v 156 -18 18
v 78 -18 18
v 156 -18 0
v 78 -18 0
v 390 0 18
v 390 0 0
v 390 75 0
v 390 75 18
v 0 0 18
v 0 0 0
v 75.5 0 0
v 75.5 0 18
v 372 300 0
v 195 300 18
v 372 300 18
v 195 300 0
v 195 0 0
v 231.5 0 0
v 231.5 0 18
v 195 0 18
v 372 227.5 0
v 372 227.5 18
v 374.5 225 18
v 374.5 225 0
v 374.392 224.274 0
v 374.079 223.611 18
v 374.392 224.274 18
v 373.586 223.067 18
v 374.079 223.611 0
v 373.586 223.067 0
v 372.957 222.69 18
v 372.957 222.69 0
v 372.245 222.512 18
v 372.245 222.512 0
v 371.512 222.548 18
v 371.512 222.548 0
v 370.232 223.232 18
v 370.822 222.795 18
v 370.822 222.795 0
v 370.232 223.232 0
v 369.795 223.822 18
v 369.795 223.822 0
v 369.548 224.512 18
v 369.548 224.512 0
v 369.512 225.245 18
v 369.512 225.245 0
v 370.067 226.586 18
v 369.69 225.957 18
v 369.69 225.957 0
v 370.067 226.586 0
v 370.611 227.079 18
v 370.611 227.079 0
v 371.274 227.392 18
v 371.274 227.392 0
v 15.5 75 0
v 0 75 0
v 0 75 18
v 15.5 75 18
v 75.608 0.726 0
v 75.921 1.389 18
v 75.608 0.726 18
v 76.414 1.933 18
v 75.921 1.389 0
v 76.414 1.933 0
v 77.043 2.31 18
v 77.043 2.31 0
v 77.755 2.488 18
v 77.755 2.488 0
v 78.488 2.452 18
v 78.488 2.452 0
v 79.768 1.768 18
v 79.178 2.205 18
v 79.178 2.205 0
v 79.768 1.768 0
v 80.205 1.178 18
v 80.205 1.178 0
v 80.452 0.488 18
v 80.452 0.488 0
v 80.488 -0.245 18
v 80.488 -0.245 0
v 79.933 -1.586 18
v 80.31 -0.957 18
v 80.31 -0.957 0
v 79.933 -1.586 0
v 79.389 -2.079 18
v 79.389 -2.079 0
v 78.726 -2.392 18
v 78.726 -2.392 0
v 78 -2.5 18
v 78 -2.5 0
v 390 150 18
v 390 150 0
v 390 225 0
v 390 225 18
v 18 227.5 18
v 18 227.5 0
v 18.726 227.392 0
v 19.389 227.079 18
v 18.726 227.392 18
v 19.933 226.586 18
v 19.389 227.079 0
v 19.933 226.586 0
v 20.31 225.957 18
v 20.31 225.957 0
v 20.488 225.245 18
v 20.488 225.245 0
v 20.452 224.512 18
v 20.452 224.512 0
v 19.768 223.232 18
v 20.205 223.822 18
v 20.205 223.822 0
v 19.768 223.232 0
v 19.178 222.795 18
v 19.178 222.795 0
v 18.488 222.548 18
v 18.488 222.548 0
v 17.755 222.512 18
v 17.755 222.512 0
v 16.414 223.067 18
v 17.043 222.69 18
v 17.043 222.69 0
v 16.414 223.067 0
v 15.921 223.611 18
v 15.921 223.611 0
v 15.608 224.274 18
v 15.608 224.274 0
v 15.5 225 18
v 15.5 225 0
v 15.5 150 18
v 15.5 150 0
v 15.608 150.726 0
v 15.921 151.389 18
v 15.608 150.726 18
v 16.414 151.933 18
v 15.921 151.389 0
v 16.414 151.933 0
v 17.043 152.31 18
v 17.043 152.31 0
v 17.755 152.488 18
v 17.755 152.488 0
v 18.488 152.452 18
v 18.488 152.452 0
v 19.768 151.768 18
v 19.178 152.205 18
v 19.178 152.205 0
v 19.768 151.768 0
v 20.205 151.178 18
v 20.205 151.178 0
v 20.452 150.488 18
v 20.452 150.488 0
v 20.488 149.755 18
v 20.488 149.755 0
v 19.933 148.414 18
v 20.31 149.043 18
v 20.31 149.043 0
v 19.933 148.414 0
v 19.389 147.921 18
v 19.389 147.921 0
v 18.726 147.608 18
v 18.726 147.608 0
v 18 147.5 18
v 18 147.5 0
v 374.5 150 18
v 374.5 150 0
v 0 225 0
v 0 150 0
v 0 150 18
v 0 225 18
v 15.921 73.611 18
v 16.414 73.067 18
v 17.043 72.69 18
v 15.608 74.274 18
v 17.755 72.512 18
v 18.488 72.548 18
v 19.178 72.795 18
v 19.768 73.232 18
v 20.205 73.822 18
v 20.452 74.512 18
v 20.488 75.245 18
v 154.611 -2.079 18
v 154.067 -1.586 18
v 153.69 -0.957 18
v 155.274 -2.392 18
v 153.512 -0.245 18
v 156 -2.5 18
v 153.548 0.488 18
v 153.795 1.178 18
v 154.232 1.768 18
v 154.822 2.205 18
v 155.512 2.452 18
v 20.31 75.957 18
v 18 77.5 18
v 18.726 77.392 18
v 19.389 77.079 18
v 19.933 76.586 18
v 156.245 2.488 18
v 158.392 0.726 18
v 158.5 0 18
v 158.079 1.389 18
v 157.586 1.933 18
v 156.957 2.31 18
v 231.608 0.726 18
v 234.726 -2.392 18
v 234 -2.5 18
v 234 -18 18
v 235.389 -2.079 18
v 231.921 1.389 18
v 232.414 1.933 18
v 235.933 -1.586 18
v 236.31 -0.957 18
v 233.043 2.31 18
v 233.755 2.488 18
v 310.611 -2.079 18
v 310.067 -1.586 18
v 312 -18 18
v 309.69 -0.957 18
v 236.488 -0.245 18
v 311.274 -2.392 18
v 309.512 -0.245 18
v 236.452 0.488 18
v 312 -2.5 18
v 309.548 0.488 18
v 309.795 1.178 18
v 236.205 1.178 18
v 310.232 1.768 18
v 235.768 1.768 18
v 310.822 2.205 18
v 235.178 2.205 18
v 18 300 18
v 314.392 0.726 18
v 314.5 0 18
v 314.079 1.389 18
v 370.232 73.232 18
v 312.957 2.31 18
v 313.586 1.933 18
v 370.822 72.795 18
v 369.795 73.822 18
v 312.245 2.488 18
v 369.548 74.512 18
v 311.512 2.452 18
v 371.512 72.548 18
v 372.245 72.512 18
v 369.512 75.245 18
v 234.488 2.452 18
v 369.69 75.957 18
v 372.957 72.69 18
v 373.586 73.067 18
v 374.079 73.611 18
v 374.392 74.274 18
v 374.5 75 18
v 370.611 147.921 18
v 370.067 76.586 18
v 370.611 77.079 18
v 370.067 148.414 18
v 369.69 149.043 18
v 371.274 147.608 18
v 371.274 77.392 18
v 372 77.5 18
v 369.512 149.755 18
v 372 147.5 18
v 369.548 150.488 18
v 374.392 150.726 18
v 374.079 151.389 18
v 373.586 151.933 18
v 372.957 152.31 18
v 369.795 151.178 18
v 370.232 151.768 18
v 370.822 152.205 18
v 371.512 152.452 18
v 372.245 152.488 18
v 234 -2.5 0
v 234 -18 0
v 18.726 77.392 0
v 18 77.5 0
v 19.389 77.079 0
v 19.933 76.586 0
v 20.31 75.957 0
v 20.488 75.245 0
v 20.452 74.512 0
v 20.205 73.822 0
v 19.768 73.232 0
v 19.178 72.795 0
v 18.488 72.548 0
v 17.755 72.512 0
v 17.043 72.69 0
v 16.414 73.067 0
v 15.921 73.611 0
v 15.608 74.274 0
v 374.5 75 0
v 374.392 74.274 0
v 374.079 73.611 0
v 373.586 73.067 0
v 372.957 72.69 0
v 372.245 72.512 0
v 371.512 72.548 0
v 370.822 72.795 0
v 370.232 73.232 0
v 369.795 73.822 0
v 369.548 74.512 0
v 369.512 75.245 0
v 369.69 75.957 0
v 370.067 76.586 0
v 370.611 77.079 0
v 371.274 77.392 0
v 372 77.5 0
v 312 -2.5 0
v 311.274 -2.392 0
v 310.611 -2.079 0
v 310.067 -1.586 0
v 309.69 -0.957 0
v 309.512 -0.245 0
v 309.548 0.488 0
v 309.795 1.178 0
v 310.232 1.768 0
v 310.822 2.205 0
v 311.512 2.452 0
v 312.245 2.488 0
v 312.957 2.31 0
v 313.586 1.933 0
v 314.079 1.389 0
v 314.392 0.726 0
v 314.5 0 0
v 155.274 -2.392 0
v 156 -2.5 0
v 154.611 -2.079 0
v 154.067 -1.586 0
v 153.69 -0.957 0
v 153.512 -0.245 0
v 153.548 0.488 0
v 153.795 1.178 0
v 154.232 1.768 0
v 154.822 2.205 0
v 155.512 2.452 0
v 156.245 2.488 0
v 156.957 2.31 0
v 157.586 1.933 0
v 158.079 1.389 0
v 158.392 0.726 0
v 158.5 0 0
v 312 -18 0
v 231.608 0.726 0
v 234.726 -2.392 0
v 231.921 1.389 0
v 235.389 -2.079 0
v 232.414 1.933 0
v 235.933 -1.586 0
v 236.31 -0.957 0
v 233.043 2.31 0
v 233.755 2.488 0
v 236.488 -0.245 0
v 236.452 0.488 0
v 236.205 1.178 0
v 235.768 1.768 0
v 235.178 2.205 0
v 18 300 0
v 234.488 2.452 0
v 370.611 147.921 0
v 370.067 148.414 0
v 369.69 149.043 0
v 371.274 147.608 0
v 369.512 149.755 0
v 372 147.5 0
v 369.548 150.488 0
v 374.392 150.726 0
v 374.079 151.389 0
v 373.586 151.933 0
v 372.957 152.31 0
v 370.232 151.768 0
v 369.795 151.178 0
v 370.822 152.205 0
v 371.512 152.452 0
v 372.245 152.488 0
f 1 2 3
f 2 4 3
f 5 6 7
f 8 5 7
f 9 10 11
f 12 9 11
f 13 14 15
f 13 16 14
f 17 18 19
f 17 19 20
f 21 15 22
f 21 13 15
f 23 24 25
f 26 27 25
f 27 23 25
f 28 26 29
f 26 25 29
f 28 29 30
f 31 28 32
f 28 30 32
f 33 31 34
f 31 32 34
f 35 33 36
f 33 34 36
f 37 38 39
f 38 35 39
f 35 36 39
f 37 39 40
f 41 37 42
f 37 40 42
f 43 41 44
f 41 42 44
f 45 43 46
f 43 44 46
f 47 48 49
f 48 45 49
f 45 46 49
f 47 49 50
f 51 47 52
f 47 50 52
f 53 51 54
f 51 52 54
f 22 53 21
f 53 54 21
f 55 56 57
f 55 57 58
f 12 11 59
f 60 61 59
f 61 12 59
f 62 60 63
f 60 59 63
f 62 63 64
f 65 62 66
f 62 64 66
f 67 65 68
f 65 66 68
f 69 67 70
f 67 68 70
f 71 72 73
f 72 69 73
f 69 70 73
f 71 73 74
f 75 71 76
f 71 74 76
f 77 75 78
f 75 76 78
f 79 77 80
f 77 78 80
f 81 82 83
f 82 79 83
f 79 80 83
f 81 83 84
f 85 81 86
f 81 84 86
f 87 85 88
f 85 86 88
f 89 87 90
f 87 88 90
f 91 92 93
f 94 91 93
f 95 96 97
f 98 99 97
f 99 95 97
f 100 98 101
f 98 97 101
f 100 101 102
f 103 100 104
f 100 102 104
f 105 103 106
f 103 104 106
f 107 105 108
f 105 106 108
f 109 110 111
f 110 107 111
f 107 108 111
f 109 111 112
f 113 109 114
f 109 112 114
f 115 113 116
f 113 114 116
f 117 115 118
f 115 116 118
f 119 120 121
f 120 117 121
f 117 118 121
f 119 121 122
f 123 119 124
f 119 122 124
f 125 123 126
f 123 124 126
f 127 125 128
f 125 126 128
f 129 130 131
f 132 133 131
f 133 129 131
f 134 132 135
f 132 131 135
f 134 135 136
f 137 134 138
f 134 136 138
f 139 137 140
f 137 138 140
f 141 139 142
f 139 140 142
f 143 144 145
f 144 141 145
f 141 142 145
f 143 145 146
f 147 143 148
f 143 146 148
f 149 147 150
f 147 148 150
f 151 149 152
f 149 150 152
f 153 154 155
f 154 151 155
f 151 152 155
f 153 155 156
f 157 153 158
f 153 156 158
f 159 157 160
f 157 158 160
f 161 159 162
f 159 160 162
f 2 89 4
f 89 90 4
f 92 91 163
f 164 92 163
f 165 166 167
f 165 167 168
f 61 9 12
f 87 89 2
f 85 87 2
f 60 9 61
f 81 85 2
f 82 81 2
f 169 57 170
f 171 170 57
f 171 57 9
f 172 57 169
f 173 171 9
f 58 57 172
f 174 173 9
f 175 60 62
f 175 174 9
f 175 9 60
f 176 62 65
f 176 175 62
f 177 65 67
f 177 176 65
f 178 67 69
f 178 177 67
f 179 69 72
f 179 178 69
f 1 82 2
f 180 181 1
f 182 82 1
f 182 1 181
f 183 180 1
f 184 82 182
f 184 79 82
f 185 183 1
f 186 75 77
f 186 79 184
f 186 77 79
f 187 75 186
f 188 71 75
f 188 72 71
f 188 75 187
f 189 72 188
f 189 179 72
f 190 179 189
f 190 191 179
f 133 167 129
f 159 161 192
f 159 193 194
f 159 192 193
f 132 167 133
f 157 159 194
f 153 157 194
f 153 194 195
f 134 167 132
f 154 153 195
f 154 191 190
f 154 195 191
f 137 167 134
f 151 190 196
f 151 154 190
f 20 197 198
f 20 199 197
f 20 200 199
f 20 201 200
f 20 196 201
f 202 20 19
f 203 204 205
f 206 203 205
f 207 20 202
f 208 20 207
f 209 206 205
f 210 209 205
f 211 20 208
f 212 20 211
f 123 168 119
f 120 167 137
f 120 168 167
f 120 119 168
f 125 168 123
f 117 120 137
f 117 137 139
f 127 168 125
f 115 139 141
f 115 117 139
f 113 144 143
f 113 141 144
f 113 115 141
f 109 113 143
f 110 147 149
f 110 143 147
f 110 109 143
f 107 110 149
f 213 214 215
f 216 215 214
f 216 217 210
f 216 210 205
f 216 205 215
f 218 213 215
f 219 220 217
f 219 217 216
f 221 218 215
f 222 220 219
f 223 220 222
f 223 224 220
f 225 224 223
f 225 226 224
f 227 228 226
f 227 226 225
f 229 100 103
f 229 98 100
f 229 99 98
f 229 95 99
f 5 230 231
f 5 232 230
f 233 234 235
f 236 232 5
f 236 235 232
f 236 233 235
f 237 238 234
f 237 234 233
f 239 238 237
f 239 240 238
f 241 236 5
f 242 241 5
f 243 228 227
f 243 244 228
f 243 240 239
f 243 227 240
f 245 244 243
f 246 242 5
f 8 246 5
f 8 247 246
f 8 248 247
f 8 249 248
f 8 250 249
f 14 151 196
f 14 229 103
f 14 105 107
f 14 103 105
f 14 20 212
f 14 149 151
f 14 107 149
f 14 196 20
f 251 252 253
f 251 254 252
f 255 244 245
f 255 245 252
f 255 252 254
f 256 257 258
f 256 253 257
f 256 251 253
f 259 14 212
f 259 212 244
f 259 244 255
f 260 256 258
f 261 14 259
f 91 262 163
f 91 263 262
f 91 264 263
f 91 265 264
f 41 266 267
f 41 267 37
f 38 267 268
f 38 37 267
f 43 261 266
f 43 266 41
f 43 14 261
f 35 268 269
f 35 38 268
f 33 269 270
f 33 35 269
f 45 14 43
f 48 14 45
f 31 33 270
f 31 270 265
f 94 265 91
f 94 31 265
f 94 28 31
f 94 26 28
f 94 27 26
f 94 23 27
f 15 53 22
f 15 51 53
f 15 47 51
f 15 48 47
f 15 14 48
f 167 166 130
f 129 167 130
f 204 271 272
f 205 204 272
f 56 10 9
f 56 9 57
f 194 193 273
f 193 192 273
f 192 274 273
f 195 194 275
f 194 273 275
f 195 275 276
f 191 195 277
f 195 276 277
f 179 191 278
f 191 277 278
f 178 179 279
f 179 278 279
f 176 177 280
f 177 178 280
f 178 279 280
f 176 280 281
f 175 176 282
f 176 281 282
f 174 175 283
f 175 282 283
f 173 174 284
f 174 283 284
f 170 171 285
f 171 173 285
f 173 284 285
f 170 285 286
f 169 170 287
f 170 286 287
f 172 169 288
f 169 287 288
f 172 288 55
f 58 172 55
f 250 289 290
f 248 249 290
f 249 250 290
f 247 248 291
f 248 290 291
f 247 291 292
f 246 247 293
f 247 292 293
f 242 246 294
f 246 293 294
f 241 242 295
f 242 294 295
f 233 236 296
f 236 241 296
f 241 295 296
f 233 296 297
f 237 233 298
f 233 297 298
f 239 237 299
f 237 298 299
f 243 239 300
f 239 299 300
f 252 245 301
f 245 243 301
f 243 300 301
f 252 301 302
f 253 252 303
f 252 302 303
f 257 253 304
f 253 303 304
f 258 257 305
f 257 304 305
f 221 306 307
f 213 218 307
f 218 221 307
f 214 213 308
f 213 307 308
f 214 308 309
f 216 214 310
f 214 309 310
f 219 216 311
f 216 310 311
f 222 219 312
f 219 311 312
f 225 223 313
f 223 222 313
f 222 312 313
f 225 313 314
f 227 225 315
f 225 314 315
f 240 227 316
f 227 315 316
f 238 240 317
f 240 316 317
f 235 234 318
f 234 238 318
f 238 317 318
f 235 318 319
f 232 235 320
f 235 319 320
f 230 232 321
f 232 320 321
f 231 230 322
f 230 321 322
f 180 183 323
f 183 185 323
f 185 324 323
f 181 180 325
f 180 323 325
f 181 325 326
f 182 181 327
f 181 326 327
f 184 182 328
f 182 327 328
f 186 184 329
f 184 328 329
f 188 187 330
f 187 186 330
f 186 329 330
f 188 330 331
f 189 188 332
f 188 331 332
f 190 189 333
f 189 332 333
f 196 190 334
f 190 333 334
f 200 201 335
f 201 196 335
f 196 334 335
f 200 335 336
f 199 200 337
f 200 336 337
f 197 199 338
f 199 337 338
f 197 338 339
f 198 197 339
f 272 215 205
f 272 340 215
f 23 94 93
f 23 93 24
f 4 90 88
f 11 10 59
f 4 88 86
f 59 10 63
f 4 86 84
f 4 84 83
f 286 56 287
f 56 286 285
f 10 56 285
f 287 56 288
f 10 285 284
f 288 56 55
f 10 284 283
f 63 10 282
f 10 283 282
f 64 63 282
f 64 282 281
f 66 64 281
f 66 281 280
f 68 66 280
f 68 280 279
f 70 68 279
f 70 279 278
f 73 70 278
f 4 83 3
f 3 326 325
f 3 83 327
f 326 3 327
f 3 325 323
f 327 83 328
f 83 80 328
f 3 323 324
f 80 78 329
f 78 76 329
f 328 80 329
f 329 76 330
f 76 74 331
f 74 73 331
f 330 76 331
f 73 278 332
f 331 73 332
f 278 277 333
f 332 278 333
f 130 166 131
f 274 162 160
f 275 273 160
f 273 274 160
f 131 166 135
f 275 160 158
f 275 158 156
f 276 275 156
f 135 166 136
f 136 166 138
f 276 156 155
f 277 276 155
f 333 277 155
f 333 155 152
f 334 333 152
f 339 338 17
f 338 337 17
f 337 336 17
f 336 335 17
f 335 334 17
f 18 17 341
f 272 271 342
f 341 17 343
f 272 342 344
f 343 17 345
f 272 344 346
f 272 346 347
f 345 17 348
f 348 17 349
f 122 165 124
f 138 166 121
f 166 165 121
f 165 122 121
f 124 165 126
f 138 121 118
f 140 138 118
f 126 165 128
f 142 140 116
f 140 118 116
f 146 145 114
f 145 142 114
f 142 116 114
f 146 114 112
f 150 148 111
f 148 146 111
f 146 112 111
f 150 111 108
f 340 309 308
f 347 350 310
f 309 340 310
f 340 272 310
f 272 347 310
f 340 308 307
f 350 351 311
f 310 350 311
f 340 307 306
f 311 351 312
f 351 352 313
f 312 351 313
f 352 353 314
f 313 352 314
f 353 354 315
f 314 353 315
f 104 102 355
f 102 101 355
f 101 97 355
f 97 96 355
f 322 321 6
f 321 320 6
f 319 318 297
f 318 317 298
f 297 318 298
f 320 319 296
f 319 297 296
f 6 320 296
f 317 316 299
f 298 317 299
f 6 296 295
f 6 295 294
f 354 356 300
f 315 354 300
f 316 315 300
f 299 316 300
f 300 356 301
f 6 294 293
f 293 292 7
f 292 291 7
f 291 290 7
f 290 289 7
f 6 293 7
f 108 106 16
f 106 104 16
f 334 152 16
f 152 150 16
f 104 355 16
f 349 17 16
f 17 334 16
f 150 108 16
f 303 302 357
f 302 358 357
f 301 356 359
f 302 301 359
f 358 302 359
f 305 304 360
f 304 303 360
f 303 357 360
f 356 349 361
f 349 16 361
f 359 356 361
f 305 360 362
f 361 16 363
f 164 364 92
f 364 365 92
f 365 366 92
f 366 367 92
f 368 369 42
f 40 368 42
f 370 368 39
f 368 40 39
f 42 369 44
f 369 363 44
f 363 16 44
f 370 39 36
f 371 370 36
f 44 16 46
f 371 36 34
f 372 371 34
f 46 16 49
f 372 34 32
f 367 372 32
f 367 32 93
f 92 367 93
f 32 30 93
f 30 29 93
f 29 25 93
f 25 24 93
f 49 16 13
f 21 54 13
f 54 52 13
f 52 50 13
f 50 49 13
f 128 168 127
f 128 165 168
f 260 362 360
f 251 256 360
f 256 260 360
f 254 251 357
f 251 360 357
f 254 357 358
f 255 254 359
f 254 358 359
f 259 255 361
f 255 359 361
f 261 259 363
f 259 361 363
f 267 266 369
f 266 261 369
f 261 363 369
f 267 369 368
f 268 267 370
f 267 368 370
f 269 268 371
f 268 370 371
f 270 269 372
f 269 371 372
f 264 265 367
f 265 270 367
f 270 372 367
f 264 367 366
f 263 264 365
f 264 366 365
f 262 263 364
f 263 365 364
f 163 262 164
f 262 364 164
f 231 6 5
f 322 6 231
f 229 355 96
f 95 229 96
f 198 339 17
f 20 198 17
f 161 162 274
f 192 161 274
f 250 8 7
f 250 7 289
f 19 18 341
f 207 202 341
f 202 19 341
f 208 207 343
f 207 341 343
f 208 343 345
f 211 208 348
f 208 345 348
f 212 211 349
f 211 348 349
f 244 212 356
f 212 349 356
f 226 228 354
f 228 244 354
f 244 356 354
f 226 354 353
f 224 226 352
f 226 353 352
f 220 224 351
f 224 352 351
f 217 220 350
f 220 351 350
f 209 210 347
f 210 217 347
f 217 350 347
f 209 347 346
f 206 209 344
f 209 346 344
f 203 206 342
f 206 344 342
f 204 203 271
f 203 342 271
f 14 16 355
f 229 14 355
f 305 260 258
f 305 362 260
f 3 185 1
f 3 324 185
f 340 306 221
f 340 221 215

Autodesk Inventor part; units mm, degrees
ref_plane "YZ Plane" through (0, 0, 0) normal (1, 0, 0) x (0, 1, 0)
ref_plane "XZ Plane" through (0, 0, 0) normal (0, 1, 0) x (-1, 0, 0)
ref_plane "XY Plane" through (0, 0, 0) normal (0, 0, 1) x (1, 0, 0)
sketch "Sketch1" plane through (0, 0, 0) normal (0, 0, 1) x (1, 0, 0)
  line L0 (195, 300) -> (18, 300)
  line L1 (78, -2.5) -> (78, -18)
  line L2 (156, -2.5) -> (156, -18)
  line L3 (78, -18) -> (156, -18)
  line L4 (158.5, 0) -> (195, 0)
  line L5 (0, 0) -> (0, 75)
  line L6 (0, 150) -> (0, 225)
  line L7 (18, 300) -> (18, 227.5)
  line L8 (18, 147.5) -> (18, 77.5)
  line L9 (0, 0) -> (75.5, 0)
  arc A0 (15.5, 225) -> (18, 227.5) centre (18, 225) ccw
  line L10 (0, 225) -> (15.5, 225)
  arc A1 (18, 147.5) -> (15.5, 150) centre (18, 150) ccw
  line L11 (0, 150) -> (15.5, 150)
  arc A2 (15.5, 75) -> (18, 77.5) centre (18, 75) ccw
  line L12 (0, 75) -> (15.5, 75)
  arc A3 (78, -2.5) -> (75.5, 0) centre (78, 0) ccw
  arc A4 (158.5, 0) -> (156, -2.5) centre (156, 0) ccw
  line L13 (390, 150) -> (374.5, 150)
  arc A5 (374.5, 150) -> (372, 147.5) centre (372, 150) ccw
  line L14 (390, 225) -> (374.5, 225)
  line L15 (390, 150) -> (390, 225)
  arc A6 (372, 227.5) -> (374.5, 225) centre (372, 225) ccw
  line L16 (372, 147.5) -> (372, 77.5)
  line L17 (372, 300) -> (372, 227.5)
  line L18 (312, -2.5) -> (312, -18)
  line L19 (234, -2.5) -> (234, -18)
  line L20 (312, -18) -> (234, -18)
  line L21 (390, 75) -> (374.5, 75)
  line L22 (390, 0) -> (390, 75)
  line L23 (390, 0) -> (314.5, 0)
  arc A7 (314.5, 0) -> (312, -2.5) centre (312, 0) ccw
  arc A8 (234, -2.5) -> (231.5, 0) centre (234, 0) ccw
  arc A9 (372, 77.5) -> (374.5, 75) centre (372, 75) ccw
  line L24 (195, 300) -> (372, 300)
  line L25 (231.5, 0) -> (195, 0)
  dimension "d0" = 78
  dimension "d1" = 78
  dimension "d2" = 300
  dimension "d3" = 5
  dimension "d4" = 18
  dimension "d5" = 5
  dimension "d6" = 15.5
  dimension "d7" = 5
  dimension "d8" = 18
  dimension "d9" = 15.5
  dimension "d10" = 5
  dimension "d11" = 5
  dimension "d12" = 18
  dimension "d13" = 18
  dimension "d14" = 78
  dimension "d15" = 75
  dimension "d16" = 75
  dimension "d17" = 75
extrude "Extrusion1" add sketch "Sketch1" along normal blind 18
properties part number "cajon lat grande"
